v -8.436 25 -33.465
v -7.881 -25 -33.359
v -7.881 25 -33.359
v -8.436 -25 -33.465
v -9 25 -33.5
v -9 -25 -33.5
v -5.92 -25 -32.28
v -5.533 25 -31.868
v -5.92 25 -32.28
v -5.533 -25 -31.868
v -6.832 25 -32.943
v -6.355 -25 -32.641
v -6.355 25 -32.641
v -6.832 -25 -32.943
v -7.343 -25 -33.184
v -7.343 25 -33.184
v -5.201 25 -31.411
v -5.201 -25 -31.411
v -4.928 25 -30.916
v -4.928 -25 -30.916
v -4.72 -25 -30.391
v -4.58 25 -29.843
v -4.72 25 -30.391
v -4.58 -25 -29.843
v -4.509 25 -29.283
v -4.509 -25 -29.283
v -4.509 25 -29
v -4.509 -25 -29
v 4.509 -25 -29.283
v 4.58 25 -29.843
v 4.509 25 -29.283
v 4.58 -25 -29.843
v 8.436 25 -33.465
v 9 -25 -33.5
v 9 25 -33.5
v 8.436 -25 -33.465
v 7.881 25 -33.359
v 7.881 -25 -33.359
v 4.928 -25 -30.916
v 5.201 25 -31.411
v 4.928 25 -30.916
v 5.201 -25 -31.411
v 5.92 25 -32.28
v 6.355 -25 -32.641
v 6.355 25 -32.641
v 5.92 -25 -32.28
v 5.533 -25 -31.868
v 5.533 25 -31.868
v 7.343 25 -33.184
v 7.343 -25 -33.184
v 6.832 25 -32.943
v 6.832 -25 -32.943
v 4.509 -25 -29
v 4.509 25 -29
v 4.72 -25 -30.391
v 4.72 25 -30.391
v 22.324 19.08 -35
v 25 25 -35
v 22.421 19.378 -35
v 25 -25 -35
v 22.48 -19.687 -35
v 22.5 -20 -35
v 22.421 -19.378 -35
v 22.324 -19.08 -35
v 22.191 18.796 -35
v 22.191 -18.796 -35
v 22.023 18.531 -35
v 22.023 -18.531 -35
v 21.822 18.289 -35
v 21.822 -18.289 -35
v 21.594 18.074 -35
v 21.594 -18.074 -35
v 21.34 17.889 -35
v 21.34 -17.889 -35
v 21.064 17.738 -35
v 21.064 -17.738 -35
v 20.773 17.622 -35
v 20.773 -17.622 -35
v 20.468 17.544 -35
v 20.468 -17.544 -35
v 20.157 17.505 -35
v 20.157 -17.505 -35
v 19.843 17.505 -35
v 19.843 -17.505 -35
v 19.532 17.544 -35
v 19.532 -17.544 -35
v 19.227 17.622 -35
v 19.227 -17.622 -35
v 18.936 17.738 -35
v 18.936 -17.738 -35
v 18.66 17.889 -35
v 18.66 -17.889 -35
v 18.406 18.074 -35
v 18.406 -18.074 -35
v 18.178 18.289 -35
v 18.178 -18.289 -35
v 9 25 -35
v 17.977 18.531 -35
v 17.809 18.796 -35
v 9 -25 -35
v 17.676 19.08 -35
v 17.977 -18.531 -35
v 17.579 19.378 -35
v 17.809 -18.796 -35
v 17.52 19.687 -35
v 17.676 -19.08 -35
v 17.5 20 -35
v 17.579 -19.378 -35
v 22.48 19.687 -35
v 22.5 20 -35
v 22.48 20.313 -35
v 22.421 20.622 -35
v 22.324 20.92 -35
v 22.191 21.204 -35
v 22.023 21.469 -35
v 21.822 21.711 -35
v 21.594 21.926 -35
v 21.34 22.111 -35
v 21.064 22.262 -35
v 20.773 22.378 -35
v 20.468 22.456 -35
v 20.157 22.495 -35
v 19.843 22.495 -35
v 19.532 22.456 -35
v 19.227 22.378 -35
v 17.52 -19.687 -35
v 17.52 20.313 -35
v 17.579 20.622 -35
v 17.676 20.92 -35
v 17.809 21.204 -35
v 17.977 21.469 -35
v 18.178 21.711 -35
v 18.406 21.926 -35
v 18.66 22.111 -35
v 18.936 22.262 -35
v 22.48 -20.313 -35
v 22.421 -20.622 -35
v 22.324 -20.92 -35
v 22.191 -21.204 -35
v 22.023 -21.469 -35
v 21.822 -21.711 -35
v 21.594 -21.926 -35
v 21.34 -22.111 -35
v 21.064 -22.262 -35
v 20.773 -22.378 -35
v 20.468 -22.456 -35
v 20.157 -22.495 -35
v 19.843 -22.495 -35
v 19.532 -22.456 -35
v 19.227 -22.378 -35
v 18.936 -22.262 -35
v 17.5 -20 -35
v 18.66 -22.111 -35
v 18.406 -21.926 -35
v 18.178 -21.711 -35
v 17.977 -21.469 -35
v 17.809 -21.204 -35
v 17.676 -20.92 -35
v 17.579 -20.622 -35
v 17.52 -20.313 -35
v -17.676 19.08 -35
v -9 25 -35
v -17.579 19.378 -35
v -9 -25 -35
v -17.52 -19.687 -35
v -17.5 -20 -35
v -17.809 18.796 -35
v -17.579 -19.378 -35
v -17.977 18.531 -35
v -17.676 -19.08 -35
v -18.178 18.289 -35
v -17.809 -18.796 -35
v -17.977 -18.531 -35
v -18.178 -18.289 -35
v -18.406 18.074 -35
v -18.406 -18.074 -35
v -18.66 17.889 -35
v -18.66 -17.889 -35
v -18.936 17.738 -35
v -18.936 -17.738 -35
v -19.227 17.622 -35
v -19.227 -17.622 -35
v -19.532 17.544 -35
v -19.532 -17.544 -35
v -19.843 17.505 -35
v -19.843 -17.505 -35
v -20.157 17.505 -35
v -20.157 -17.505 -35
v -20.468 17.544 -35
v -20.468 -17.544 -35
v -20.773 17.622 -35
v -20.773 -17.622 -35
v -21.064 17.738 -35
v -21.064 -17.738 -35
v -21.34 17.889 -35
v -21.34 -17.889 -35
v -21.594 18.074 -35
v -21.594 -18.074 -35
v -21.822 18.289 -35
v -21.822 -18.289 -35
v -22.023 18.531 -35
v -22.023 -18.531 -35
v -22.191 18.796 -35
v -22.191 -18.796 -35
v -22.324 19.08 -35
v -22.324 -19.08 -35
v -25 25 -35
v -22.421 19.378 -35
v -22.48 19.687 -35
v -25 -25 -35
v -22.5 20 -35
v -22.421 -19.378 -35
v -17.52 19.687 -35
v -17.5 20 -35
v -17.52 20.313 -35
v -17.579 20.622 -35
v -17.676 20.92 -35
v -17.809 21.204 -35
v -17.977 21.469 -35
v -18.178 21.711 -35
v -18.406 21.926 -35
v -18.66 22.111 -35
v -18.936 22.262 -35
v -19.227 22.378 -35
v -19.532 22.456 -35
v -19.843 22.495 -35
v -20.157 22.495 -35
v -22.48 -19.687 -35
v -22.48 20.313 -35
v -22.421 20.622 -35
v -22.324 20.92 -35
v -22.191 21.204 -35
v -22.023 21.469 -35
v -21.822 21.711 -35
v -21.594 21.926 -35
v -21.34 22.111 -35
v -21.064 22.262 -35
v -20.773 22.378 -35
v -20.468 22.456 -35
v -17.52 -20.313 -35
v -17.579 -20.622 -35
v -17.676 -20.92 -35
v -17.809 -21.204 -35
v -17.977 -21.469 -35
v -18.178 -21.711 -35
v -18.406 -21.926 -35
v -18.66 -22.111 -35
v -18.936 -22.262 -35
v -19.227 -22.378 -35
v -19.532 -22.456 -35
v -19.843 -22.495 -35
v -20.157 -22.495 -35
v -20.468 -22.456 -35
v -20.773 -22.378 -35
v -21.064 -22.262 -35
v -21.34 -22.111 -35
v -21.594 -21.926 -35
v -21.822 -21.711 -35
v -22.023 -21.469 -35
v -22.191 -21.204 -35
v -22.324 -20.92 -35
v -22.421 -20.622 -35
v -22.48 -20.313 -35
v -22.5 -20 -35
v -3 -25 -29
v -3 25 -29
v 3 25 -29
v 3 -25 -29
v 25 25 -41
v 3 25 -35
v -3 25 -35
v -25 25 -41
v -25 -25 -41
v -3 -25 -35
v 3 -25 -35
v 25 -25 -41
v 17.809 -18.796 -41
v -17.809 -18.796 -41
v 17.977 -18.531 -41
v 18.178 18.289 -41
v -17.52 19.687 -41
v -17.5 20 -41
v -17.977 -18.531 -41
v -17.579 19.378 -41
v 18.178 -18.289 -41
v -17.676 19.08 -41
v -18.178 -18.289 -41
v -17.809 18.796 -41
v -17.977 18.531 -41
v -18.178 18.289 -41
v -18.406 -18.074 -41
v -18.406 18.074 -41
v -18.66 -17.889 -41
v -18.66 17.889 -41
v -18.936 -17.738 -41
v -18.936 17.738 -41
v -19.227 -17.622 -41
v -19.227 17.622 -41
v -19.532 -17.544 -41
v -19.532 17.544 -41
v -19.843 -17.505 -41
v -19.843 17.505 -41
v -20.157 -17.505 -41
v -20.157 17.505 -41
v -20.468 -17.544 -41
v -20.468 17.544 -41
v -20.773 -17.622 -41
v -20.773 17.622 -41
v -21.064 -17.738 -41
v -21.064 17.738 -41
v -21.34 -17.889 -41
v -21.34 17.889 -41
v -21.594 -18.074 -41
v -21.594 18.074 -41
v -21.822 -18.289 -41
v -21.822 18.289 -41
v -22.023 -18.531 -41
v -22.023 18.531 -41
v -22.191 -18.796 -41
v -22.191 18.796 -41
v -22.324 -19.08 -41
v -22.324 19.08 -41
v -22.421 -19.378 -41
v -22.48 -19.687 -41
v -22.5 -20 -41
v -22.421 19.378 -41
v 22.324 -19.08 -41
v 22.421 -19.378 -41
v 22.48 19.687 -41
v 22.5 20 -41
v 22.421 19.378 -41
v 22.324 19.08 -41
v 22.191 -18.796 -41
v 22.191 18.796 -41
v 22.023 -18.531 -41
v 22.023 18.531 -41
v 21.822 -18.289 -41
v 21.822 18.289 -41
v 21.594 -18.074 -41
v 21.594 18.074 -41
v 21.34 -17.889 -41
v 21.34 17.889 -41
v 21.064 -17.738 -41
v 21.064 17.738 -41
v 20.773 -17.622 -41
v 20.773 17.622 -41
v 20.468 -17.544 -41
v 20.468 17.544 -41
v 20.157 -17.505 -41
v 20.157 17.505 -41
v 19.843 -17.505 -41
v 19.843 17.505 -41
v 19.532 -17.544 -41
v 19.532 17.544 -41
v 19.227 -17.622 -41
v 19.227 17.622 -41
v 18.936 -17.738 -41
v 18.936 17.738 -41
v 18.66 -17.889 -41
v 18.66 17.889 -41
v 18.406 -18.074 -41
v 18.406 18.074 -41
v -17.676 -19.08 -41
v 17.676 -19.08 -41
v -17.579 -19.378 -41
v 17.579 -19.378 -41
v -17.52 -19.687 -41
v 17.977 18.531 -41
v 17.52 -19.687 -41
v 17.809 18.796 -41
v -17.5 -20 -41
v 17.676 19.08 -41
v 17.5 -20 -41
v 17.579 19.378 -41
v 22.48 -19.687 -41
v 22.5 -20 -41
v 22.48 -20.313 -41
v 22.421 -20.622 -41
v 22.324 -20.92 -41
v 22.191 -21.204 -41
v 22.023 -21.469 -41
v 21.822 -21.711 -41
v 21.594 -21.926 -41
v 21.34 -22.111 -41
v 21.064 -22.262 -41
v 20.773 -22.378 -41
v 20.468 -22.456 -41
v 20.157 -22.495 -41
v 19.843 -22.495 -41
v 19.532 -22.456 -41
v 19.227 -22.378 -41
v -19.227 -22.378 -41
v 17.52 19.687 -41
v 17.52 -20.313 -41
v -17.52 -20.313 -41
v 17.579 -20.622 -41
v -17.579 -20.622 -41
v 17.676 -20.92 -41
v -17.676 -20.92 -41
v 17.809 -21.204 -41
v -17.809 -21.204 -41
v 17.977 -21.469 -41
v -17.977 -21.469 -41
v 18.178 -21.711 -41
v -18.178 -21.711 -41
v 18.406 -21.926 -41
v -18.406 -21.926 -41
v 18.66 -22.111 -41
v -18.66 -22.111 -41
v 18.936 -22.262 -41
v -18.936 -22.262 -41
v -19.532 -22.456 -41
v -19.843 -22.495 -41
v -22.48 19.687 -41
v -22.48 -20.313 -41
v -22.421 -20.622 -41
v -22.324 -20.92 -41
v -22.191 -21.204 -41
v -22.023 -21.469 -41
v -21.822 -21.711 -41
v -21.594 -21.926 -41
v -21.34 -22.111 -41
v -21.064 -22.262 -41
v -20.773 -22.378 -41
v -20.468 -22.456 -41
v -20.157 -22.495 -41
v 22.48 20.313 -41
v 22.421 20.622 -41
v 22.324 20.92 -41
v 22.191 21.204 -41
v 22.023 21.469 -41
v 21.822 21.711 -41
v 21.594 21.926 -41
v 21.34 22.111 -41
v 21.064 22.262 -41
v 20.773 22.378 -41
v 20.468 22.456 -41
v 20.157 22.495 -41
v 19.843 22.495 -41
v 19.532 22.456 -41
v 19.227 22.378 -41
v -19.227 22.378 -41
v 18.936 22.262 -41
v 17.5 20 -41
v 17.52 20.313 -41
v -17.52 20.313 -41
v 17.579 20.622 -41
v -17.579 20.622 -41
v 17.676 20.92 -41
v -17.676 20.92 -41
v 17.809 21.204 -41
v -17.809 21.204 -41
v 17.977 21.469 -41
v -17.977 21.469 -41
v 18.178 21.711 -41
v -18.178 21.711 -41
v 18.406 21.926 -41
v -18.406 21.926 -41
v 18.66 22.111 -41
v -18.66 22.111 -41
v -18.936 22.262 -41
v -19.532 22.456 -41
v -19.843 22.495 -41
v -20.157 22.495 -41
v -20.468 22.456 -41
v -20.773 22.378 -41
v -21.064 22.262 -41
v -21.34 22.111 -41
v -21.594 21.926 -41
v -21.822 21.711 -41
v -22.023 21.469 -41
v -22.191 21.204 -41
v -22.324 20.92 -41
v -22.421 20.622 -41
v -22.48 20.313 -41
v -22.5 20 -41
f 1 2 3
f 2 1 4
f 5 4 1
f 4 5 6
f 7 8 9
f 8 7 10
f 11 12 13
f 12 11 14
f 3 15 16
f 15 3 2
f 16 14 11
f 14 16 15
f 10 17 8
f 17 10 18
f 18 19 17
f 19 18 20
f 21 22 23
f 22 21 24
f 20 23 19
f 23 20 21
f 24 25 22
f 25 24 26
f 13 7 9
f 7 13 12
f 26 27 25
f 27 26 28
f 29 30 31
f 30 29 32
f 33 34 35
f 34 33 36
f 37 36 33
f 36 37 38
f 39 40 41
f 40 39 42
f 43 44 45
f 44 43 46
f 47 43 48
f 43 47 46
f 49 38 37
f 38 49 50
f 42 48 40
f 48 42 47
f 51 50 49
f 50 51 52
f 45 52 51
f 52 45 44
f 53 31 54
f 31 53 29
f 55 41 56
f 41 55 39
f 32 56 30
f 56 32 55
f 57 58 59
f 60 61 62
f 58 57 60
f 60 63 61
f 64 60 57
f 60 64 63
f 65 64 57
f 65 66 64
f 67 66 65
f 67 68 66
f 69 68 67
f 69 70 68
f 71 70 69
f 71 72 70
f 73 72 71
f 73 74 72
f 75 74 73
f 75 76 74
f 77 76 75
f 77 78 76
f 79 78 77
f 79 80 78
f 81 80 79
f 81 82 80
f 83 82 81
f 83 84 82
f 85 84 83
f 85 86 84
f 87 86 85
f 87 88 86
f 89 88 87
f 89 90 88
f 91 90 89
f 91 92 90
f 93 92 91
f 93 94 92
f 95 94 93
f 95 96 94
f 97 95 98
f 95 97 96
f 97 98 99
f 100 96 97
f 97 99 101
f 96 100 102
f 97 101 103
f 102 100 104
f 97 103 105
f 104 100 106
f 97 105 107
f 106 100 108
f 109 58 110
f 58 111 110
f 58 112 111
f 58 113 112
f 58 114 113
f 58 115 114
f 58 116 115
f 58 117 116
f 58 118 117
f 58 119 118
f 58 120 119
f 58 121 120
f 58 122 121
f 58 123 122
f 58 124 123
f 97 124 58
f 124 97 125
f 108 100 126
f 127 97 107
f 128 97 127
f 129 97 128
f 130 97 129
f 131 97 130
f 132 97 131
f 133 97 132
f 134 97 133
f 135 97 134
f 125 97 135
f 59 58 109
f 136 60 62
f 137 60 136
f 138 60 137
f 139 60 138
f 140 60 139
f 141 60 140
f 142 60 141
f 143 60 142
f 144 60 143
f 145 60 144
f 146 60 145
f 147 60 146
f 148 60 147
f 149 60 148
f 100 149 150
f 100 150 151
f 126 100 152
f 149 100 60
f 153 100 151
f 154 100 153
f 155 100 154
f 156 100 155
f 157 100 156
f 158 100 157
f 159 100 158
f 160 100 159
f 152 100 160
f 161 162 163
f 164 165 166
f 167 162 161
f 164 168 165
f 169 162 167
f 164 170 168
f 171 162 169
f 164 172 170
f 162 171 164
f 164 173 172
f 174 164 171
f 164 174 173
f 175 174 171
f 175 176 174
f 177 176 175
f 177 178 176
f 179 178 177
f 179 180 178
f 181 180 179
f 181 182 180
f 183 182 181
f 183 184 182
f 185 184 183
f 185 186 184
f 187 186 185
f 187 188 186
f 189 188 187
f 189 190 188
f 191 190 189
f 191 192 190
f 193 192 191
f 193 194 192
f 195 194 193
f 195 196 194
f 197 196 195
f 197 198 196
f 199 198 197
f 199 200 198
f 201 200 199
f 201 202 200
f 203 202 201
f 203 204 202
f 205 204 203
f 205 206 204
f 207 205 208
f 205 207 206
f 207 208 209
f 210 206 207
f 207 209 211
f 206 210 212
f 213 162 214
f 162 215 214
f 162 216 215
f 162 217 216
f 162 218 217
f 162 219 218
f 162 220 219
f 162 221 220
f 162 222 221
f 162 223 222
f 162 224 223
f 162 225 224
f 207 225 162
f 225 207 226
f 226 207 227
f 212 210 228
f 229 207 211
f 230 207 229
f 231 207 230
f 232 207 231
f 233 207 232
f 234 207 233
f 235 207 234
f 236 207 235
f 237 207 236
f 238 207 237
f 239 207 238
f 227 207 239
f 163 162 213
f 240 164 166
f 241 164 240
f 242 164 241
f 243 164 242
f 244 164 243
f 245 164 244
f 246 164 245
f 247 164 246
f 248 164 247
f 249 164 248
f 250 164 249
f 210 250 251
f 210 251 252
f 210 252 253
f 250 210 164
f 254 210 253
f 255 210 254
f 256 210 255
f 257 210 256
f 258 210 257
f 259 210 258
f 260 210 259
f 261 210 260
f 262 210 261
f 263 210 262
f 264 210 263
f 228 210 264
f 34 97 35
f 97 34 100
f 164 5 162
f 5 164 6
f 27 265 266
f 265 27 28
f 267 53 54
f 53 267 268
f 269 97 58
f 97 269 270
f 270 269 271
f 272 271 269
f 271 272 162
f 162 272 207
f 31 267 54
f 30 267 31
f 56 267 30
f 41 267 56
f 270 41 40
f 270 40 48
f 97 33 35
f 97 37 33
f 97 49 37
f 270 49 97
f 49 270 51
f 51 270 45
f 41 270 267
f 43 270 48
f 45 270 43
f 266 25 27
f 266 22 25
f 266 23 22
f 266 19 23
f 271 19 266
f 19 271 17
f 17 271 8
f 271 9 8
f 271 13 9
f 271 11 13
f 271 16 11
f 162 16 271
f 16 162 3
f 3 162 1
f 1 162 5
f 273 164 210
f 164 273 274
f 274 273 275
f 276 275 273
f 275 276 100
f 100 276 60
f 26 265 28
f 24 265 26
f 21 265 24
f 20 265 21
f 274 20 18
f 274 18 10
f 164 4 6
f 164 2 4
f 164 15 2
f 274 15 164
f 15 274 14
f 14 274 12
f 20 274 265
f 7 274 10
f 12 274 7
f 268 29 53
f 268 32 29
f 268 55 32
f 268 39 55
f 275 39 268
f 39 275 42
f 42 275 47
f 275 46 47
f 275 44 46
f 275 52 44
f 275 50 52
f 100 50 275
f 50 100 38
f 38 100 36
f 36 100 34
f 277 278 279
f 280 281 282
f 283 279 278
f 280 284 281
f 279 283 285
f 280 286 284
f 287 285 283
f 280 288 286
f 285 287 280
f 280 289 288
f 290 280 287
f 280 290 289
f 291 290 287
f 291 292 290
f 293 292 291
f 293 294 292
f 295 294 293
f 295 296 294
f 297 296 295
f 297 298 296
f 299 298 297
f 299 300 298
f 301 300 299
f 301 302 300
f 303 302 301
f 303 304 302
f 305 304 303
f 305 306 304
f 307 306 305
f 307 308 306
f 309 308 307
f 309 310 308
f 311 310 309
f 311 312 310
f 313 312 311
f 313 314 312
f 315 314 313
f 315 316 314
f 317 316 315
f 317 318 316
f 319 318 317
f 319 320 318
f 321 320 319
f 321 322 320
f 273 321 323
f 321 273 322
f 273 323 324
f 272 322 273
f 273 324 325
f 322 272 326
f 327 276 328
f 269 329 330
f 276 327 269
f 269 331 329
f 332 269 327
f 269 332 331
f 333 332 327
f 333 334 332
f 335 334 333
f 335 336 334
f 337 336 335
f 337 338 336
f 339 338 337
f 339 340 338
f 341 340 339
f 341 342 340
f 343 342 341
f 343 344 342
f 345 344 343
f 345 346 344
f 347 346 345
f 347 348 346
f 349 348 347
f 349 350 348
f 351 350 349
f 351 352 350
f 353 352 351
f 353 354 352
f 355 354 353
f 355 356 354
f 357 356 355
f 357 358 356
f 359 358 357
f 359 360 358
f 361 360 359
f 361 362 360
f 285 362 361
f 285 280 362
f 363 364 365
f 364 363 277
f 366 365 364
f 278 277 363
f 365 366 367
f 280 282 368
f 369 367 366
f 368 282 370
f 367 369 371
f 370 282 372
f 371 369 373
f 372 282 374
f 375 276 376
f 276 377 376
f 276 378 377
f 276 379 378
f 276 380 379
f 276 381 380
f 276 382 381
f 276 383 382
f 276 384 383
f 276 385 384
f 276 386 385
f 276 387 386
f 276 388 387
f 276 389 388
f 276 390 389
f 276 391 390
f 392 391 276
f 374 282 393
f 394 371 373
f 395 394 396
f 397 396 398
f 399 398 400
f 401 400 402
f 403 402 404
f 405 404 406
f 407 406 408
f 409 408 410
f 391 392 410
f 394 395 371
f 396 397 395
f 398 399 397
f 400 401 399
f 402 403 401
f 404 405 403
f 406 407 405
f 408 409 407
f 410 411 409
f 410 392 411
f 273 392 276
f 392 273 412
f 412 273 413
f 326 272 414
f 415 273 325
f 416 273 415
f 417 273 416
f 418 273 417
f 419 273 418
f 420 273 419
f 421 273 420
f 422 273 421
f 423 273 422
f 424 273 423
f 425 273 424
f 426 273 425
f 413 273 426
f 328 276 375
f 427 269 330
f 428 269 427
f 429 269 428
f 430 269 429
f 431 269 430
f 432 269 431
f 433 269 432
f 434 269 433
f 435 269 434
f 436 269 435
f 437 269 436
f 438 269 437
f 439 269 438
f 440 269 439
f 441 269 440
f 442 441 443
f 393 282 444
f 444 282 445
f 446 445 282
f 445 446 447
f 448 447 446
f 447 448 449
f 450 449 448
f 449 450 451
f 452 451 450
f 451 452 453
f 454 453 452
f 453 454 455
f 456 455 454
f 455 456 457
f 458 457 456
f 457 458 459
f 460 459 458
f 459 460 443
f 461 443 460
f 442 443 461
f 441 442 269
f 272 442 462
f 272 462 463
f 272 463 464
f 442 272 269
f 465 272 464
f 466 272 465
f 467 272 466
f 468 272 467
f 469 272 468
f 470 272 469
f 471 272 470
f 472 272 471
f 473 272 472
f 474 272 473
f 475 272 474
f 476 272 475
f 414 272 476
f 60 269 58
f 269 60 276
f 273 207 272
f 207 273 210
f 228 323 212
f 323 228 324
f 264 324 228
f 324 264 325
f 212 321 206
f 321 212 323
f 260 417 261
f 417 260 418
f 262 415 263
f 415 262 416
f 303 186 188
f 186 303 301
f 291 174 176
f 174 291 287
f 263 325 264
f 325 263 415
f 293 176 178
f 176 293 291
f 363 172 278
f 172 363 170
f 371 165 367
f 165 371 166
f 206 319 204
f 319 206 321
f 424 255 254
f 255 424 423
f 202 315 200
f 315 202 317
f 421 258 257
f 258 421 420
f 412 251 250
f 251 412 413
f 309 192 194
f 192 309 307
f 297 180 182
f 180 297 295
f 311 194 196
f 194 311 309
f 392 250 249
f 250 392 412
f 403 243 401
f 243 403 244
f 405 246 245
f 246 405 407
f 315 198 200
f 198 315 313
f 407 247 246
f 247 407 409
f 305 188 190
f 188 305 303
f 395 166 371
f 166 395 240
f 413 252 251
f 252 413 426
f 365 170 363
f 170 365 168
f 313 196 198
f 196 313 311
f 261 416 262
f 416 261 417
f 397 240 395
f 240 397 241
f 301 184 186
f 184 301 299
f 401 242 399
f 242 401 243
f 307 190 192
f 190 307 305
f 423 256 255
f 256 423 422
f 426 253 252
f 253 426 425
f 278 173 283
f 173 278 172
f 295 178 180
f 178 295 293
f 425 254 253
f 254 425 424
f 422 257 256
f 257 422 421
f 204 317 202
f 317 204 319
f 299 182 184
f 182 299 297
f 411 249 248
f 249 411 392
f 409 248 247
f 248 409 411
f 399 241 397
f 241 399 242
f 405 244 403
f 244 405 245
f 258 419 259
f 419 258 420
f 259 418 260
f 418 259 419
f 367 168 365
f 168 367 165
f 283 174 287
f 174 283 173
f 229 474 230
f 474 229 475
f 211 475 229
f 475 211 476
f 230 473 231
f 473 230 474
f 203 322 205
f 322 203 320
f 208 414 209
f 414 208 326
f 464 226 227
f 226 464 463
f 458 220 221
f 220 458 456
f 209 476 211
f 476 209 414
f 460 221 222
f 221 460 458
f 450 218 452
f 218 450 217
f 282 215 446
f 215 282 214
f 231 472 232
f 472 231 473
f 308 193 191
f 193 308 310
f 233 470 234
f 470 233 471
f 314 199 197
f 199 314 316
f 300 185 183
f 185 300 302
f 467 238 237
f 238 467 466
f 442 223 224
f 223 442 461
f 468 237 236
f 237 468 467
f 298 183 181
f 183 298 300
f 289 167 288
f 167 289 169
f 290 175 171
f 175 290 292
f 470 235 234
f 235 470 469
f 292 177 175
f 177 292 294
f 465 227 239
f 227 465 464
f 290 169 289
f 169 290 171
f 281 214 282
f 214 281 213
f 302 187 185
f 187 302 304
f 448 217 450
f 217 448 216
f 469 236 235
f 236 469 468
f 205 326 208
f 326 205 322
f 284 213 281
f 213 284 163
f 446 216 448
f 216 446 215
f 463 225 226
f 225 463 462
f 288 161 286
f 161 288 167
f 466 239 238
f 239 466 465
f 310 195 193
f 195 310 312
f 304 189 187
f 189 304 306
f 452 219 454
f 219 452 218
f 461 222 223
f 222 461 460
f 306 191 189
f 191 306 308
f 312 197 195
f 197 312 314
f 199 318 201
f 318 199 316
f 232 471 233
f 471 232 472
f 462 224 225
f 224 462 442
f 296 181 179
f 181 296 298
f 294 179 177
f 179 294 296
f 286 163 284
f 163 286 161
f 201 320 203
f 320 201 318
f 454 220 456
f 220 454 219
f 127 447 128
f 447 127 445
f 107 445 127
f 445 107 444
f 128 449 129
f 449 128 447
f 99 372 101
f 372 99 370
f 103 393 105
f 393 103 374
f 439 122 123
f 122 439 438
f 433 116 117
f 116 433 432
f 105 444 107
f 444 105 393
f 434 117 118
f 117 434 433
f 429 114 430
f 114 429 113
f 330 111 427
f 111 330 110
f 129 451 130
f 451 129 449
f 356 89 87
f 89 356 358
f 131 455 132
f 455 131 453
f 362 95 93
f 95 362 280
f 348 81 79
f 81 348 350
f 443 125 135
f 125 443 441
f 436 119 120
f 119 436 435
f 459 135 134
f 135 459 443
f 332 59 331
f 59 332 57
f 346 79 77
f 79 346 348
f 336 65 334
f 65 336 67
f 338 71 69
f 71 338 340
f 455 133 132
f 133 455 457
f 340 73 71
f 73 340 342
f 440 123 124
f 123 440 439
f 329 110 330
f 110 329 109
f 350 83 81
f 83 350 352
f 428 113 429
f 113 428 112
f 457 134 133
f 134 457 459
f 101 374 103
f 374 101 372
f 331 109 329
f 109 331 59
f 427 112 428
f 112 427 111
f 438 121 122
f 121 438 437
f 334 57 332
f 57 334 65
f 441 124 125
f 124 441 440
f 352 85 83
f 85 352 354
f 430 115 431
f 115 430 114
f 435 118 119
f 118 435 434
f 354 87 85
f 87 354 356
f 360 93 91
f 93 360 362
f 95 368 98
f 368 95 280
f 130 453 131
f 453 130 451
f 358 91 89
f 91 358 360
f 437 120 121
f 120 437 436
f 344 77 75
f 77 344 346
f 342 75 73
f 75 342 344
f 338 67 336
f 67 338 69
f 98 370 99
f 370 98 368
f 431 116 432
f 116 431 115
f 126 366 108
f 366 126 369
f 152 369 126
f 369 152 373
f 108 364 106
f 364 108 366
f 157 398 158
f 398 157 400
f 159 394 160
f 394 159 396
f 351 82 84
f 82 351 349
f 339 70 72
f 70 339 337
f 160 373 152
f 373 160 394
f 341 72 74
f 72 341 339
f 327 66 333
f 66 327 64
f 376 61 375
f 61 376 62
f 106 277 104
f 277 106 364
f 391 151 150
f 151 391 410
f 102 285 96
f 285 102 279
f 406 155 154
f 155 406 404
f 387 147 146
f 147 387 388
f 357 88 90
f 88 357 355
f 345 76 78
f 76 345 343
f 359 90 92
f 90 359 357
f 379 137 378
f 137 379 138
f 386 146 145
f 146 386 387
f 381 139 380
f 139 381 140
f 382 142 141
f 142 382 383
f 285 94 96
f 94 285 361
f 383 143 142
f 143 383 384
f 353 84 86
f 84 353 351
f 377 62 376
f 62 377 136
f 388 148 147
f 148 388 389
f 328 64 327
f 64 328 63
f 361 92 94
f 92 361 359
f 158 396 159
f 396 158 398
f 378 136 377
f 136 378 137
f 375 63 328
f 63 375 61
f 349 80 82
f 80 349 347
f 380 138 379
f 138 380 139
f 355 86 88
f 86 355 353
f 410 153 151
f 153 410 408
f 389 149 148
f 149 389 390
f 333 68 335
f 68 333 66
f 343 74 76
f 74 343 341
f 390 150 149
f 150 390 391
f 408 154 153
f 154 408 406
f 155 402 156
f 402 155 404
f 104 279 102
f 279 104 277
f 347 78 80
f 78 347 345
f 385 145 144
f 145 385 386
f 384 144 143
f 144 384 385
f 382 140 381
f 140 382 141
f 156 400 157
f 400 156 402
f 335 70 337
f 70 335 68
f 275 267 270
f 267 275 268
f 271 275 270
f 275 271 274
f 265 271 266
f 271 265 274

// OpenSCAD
// file: bigwheel.scad
/**
 * A gear wheel
 * With axis for the rest of the POC (goes through the bulkhead)
 * with the different parts of the hub.
 *
 * Optional small wheel gear.
 *
 * See 'option' variable down the script for printing.
 *
 * @author OlivierLD
 */
 
use <../gears.scad>

BULKHEAD_THISCKNESS = 6.5; // A bit more than 6

wheelThickness = 5;

module gear(teeth=96, opt=true, thickness=wheelThickness) {
	spur_gear(modul=1, 
						tooth_number=teeth,// orig 30
						width=thickness,   // Thickness
						bore=0,            // Axis diam. 0 means no drilling.
						pressure_angle=30, // On the teeth. orig 20
						helix_angle=0,     // Teeth angle. orig 20
						optimized=opt);    // true: thinner inside, with hollows.
}
 
/*
 * Two axis: 
 * - One to maintain the distance between the wheel and the blukhead
 * - One that goes through the blukhead
 */
distFromBulkhead = 9;
firstAxisDiam = 20;
deltaThickness = 1;
secondAxisDiam = 8;
slack = 0.5;
secondAxisLength = BULKHEAD_THISCKNESS + slack; // From first axis top
 
module big_wheel_axis() {
	union() {
		cylinder(d=firstAxisDiam, h=distFromBulkhead + (1 * deltaThickness), $fn=50, center=true);
		translate([0, 0, ((distFromBulkhead + secondAxisLength + deltaThickness + 3) / 2) - (1 * 3)]) {
			difference() { // Axis is drilled
				cylinder(d=secondAxisDiam, h=secondAxisLength + (1 * 3), $fn=50, center=true);
				drillDiam = 2;
				drillLength = 15;
				translate([0, 0, ((secondAxisLength - drillLength) / 2) + 1]) { // 1, to see the tip
					cylinder(d=drillDiam, h=drillLength, $fn=50, center=true);
				}
			}
		}
	}
}

module small_wheel_axis(length=10) {
	servoAxisDiam = 6; // Just like the pot...
	axisLength = length; // TODO To be adjusted!!
	difference() {
		cylinder(d=throughAxisDiam, h=axisLength, center=true, $fn=50);
		// Hollow part
		translate([0, 0, 0.5]) {
			cylinder(d=servoAxisDiam, h=axisLength, center=true, $fn=50);
		}			
		// Axis screw, diam 2mm
		axisScrewDiam = 2;
		axisScrewLength = 4;
		translate([(servoAxisDiam / 2) + ((throughAxisDiam - servoAxisDiam) / 4), 0, 0]) {
			rotate([0, 90, 0]) {
				cylinder(d=axisScrewDiam, h=1.2 * axisScrewLength, center=true, $fn=50);
			}
		}
	}
}

/**
 * The one on the other side of the bulkhead, to lock the wheel in place.
 */
throughAxisDiam = secondAxisDiam + 4; // The AXIS in the blukhead!! 
hubWasherThickness = 4;
hubWasherDiam = 30;

module hubLock(hollowDiam=2) {
	
	drillDiam = 2;

	difference() {
		union() {
			difference() {
				cylinder(d=throughAxisDiam, h=(BULKHEAD_THISCKNESS + (0 * hubWasherThickness)), center=true, $fn=50);
				// Hollow part
				translate([0, 0, (slack * 0.5)]) {
					cylinder(d=hollowDiam, h=(BULKHEAD_THISCKNESS + slack), center=true, $fn=50);
				}			
			}
			// washer
			translate([0, 0, (BULKHEAD_THISCKNESS / 2) + (hubWasherThickness / 2)]) {
				difference() {
					cylinder(d=hubWasherDiam, h=hubWasherThickness, $fn=100, center=true);
					// Drill holes here
					for (angle = [0:90:359]) {
						rotate([0, 0, angle]) {
							translate([3 * (hubWasherDiam / 8), 0, 0]) {
								cylinder(d=drillDiam, h=10, $fn=50, center=true);
							}
						}
					}
				}
			}	
		}
		// drilling
		translate([0, 0, (BULKHEAD_THISCKNESS + hubWasherThickness) / 2]) {
			translate([0, 0, hubWasherThickness - 2]) { // -2: Actual depth
				screwHeadDiam = 5.5; // was drillDiam * 2.5...
				cylinder(d=screwHeadDiam, h=5, $fn=50, center=true); // Screw head
			}
			cylinder(d=drillDiam, h=10, $fn=50, center=true);
		}
	}
}

module smallGear() {
	gearThickness = 10;
	axisLength = 6; //10;
	v2 = true; // For a servo
	difference() {
		union() {
			gear(teeth=30, opt=false, thickness=gearThickness);
			if (!v2) {
				translate([0, 0, (wheelThickness) + (axisLength / 2)]) {
					small_wheel_axis(axisLength);
				}
			}
		}
		if (v2) { // Hollow axis
			translate([0, 0, gearThickness - 5]) {
				cylinder(d=6, h=gearThickness, $fn=50);
			}
		}
		// Servo axis screw and screw head socket
		screwDiam = 2.5;
		screwHeadDiam = 5.5;
		screwHeadDepth = 3;
		translate([0, 0, (wheelThickness / 2)]) {
			cylinder(d=screwDiam, h=2*wheelThickness, center=true, $fn=50);
		}
		translate([0, 0, -0 * wheelThickness]) {
			cylinder(d=screwHeadDiam, h=screwHeadDepth, center=true, $fn=50);
		}
	}
}

module allGears(stuck=true) {
	union() {
		gear(opt=true);
		translate([0, 0, (wheelThickness - deltaThickness) + (distFromBulkhead / 2)]) {
			big_wheel_axis();
		}

		translate([(96 + 30) / 2, 0, 0]) { // 96: big wheel teeth, 30: small wheel teeth
			rotate([0, 0, 6]) { // 6 = (360 / 30) * 0.5 - Rotate 1/2 teeth
				smallGear();
			}
		}

		translate([0, 0, stuck ? distFromBulkhead - (0 * deltaThickness) + (1 * slack) + secondAxisLength : 30]) {
			hubLock(secondAxisDiam);
		}

		echo("From bulkhead to hub top:", (secondAxisLength + (2 * hubWasherThickness)));
		translate([0, 0, stuck ? distFromBulkhead - (0 * deltaThickness) + (1 * slack) + secondAxisLength + hubWasherThickness + (BULKHEAD_THISCKNESS + (1.05 * hubWasherThickness)): 55]) {
			rotate([180, 0, 0]) {
				// 6: potDiam
				potAxisDiam = 6;
				hubLock(potAxisDiam);
			}
		}
	}
}


ALL_PARTS = 10;

BIG_WHEEL_ONLY = 1;
HUB_LOCK_ONLY = 2;
POT_SOCKET = 3;
SMALL_WHEEL_ONLY = 4;

option = BIG_WHEEL_ONLY;

stuck = true;
 
union() { 
	
	if (option == ALL_PARTS || option == BIG_WHEEL_ONLY) {
		gear(opt=true);
		translate([0, 0, (wheelThickness - deltaThickness) + (distFromBulkhead / 2)]) {
			big_wheel_axis();
		}
	}

	if (option == ALL_PARTS || option == SMALL_WHEEL_ONLY) {
		translate([(96 + 30) / 2, 0, 0]) { // 96: big wheel teeth, 30: small wheel teeth
			rotate([0, 0, 6]) { // 6 = (360 / 30) * 0.5 - Rotate 1/2 teeth
				smallGear();
			}
		}
	}

	if (option == ALL_PARTS || option == HUB_LOCK_ONLY) {
		translate([0, 0, stuck ? distFromBulkhead + (0 * deltaThickness) + (1 * slack) + secondAxisLength : 30]) {
			hubLock(secondAxisDiam);
		}
	}

	if (option == ALL_PARTS || option == POT_SOCKET) {
		
		echo("From bulkhead to hub top:", (secondAxisLength + (2 * hubWasherThickness)));
		translate([0, 0, stuck ? distFromBulkhead + (0 * deltaThickness) + (1 * slack) + secondAxisLength + hubWasherThickness + (BULKHEAD_THISCKNESS + (1.05 * hubWasherThickness)): 55]) {
			rotate([180, 0, 0]) {
				// 6: potDiam
				potAxisDiam = 6;
				hubLock(potAxisDiam);
			}
		}
	}
}
// main file
/**
 * @author OlivierLD
 * 
 * A test, a stand for a servoParallax900_00005()
 */
use <../mechanical.parts.scad>
use <./bigwheel.scad>

servoXOffset = 29.1; // From the servo's specs. See in mechanical.parts.scad
servoZOffset = 10;
standThickness = 6;

deeper = 1;

// ServoCity 615286, https://www.servocity.com/32p-24t-c1-spline-servo-mount-gears-metal
// Wheel Pitch Diam: 0.750"
// smallWheelPitchDiam = 25.4 * 0.750;

// 3D printed one
smallWheelPitchDiam = 30;

betweenWheelAxis = (96 + smallWheelPitchDiam) / 2;

verticalBoardWidth = 50;
verticalBoardHeight = 70;
horizontalStandLength = 50;

module servoSocket() {
	difference() {
		cube(size=[standThickness, verticalBoardWidth, verticalBoardHeight], center=true);
		translate([- (standThickness / 2) - (servoXOffset) + deeper, 0, servoZOffset]) {
			rotate([0, 90, 0]) {
				color("darkgrey", 0.95) {
					%servoParallax900_00005();
				}
				translate([0, 0, 5]) {
					color("silver") {
						servoParallax900_00005(drillPattern=true, drillDiam=2.5, drillLength=10);
					}
				}
				// Servo axis? Uncomment below if visualization is needed.
				// cylinder(d=2, h=100, center=true, $fn=50);
			}
		}
	}
	// Other servo axis, for verification
	otherAxis = false;
	if (otherAxis) {
		translate([0, 0, servoZOffset]) {
			rotate([0, 90, 0]) {
				cylinder(d=2, h=100, center=true, $fn=50);
			}
		}
	}
}

// Horizontal stand
fixingScrewsDiam = 5;
module socketStand() {
	rotate([0, 90, 0]) {
		translate([(verticalBoardHeight / 2), 
							 -(verticalBoardWidth / 2), 
							 -(horizontalStandLength / 2)]) {
			difference() {						
				union() {							 
					cube(size=[standThickness, verticalBoardWidth, horizontalStandLength]);
					difference() {
						translate([-standThickness, 0, (verticalBoardWidth / 2) - (3 * standThickness / 2)]) {
							cube(size=[standThickness, verticalBoardWidth, 3 * standThickness]);
						}
						rotate([90, 0, 0]) {
							cylinderDiam = standThickness * 1.5;
							translate([-standThickness, // Height
												 (horizontalStandLength / 2) - (3 * standThickness / 2), 
												 -verticalBoardWidth * 1.05]) {
								cylinder(h=verticalBoardWidth * 1.1, d=cylinderDiam, $fn=50);
							}
							translate([-standThickness, // Height
												 (horizontalStandLength / 2) + (3 * standThickness / 2), 
												 -verticalBoardWidth * 1.05]) {
								cylinder(h=verticalBoardWidth * 1.1, d=cylinderDiam, $fn=50);
							}
						}
					}
				}
				// Drill holes
				rotate([0, 90, 0]) {
					translate([-fixingScrewsDiam, fixingScrewsDiam, -(standThickness / 2)]) {
						cylinder(h=(2 * standThickness), d=fixingScrewsDiam, $fn=50);
					}
					translate([-fixingScrewsDiam, horizontalStandLength - fixingScrewsDiam, -(standThickness / 2)]) {
						cylinder(h=(2 * standThickness), d=fixingScrewsDiam, $fn=50);
					}
					translate([-(verticalBoardWidth - fixingScrewsDiam), horizontalStandLength - fixingScrewsDiam, -(standThickness / 2)]) {
						cylinder(h=(2 * standThickness), d=fixingScrewsDiam, $fn=50);
					}
					translate([-(verticalBoardWidth - fixingScrewsDiam), fixingScrewsDiam, -(standThickness / 2)]) {
						cylinder(h=(2 * standThickness), d=fixingScrewsDiam, $fn=50);
					}
				}
			}
		}
	}
}

module fullPlate() { // The vertical one
	
	totalHeight = 130;
	difference() {
		union() {
			servoSocket();
			translate([-(standThickness / 2), 
								 -(verticalBoardWidth / 2), 
			           +(verticalBoardHeight / 2)]) {
				cube(size=[standThickness, verticalBoardWidth, (totalHeight - verticalBoardHeight)]);
			}
		}
		gearThickness = 5;
		distFromPlate = 9;
		slack = 0.5;
		
		rotate([0, 90, 180]) {
			translate([-servoZOffset - betweenWheelAxis, 
								 0, 
								 -(standThickness / 2) - (1 * gearThickness) - (1 * distFromPlate) + (0.6 * slack)]) {
				color("green") {
					#allGears(stuck = true);
				}
			}
		}
	}
}

// Pot bracket, 25mm wide, mini inner width = (2 * washer-thickness) + wallThickness + ~6mm
// Here (2 * 4) + 6 + 6 = 20mm, + whatever.

smallB10Kaxis = true; // If true: narrower.

minPotPlateHeight = 20 + (smallB10Kaxis ? 0 : 3); // TODO Tweak that. See tinyStuffHeight in machanical.parts.scad

topPlateWidth = 25;
topStandThickness = 6;
potPlateOffset = 20; // minimum hubWasherDiam / 2


module topPlateScrews() {
	screwDiam = 2.5;
	screwLen = 30;
	
	rotate([0, 90, 0]) {
		translate([-(potPlateOffset + 5), topPlateWidth / 3, -5]) {
			cylinder(d=screwDiam, h=screwLen, $fn=50);
		}
		translate([-(potPlateOffset + 5), -topPlateWidth / 3, -5]) {
			cylinder(d=screwDiam, h=screwLen, $fn=50);
		}
	}
}

module topPlate(smallB10K=false) {
  bottomToFirstPlateTop = 8.2 + 1.3; // + 2.2;
  standThickness = topStandThickness;
	
	plateLength = potPlateOffset + 20;

	difference() {
		translate([0, 0, -potPlateOffset + 20 + 10]) {
			cube(size=[standThickness, topPlateWidth, plateLength], center=true);
		}
		// #topPlateScrews();
		translate([- (standThickness / 2) - bottomToFirstPlateTop, 0, 0]) {
			rotate([0, 90, 0]) {
				rotate([0, 0, -90]) {
					color("silver") {
						%B10K(small=smallB10K);
					}
				}
			}
		}
	}
}

TOP_PLATE_ONLY = 1;
NO_TOP_PLATE = 2;
WITH_TOP_PLATE = 3;

module b10kBracket(option=WITH_TOP_PLATE) {
	standLength = 20;

	if (option == WITH_TOP_PLATE || option == TOP_PLATE_ONLY) {
		rotate([0, -90, -90]) {
			translate([-(topStandThickness / 2), (topPlateWidth / 2), -potPlateOffset]) {
				difference() {
					topPlate(smallB10K=smallB10Kaxis);
					topPlateScrews();
				}
			}
		}
	}
	
	if (option != TOP_PLATE_ONLY) {	
		translate([0, 0, -topStandThickness]) {
			difference() {
				cube(size=[topPlateWidth, standLength, minPotPlateHeight + topStandThickness]);
				translate([(topPlateWidth / 2), standLength + 10, 0]) {
					rotate([0, 90, 0]) {
						linear_extrude(height=topPlateWidth * 1.1, center=true) {
							resize([2 * minPotPlateHeight, (2 * standLength)]) {
								circle(d=20, $fn=100);
							}
						}
						rotate([90, 0, 0]) {
							translate([-15, 0, 0]) {
								topPlateScrews();
							}
						}
					}
				}
			}
		}
	}
}


SERVO_SOCKET_ONLY = 1;
SOCKET_STAND_ONLY = 2;
POT_BRACKET_ONLY = 3; // Not to print
TOP_POT_PLATE_ONLY = 4;

ALL_PARTS = 10;

// Change at will with the values above
option = SOCKET_STAND_ONLY; // ALL_PARTS;

if (option == ALL_PARTS) {
  fullPlate();
  socketStand();
	rotate([0, 90, 0]) {
		rotate([0, 0, -90]) {
			translate([-(topPlateWidth / 2), 
								 // -52.85, // TODO Replace this one, betweenWheelAxis and friends
								 - (betweenWheelAxis - servoZOffset),
								 -(standThickness / 2) - (minPotPlateHeight)]) {
				b10kBracket();
			}
		}
	}
} else if (option == SERVO_SOCKET_ONLY) {
  // servoSocket();
	fullPlate();
	rotate([0, 90, 0]) {
		rotate([0, 0, -90]) {
			translate([-(topPlateWidth / 2), 
								 // -52.85, // TODO Replace this one, betweenWheelAxis and friends
								 - (betweenWheelAxis - servoZOffset),
								 -(standThickness / 2) - (minPotPlateHeight)]) {
				b10kBracket(NO_TOP_PLATE);
			}
		}
	}
} else if (option == SOCKET_STAND_ONLY) {
	difference() {
		socketStand();
		servoSocket();
	}
} else if (option == TOP_POT_PLATE_ONLY) {
	b10kBracket(option=TOP_PLATE_ONLY);
} else if (option == POT_BRACKET_ONLY) {
	b10kBracket(option=WITH_TOP_PLATE);
}
